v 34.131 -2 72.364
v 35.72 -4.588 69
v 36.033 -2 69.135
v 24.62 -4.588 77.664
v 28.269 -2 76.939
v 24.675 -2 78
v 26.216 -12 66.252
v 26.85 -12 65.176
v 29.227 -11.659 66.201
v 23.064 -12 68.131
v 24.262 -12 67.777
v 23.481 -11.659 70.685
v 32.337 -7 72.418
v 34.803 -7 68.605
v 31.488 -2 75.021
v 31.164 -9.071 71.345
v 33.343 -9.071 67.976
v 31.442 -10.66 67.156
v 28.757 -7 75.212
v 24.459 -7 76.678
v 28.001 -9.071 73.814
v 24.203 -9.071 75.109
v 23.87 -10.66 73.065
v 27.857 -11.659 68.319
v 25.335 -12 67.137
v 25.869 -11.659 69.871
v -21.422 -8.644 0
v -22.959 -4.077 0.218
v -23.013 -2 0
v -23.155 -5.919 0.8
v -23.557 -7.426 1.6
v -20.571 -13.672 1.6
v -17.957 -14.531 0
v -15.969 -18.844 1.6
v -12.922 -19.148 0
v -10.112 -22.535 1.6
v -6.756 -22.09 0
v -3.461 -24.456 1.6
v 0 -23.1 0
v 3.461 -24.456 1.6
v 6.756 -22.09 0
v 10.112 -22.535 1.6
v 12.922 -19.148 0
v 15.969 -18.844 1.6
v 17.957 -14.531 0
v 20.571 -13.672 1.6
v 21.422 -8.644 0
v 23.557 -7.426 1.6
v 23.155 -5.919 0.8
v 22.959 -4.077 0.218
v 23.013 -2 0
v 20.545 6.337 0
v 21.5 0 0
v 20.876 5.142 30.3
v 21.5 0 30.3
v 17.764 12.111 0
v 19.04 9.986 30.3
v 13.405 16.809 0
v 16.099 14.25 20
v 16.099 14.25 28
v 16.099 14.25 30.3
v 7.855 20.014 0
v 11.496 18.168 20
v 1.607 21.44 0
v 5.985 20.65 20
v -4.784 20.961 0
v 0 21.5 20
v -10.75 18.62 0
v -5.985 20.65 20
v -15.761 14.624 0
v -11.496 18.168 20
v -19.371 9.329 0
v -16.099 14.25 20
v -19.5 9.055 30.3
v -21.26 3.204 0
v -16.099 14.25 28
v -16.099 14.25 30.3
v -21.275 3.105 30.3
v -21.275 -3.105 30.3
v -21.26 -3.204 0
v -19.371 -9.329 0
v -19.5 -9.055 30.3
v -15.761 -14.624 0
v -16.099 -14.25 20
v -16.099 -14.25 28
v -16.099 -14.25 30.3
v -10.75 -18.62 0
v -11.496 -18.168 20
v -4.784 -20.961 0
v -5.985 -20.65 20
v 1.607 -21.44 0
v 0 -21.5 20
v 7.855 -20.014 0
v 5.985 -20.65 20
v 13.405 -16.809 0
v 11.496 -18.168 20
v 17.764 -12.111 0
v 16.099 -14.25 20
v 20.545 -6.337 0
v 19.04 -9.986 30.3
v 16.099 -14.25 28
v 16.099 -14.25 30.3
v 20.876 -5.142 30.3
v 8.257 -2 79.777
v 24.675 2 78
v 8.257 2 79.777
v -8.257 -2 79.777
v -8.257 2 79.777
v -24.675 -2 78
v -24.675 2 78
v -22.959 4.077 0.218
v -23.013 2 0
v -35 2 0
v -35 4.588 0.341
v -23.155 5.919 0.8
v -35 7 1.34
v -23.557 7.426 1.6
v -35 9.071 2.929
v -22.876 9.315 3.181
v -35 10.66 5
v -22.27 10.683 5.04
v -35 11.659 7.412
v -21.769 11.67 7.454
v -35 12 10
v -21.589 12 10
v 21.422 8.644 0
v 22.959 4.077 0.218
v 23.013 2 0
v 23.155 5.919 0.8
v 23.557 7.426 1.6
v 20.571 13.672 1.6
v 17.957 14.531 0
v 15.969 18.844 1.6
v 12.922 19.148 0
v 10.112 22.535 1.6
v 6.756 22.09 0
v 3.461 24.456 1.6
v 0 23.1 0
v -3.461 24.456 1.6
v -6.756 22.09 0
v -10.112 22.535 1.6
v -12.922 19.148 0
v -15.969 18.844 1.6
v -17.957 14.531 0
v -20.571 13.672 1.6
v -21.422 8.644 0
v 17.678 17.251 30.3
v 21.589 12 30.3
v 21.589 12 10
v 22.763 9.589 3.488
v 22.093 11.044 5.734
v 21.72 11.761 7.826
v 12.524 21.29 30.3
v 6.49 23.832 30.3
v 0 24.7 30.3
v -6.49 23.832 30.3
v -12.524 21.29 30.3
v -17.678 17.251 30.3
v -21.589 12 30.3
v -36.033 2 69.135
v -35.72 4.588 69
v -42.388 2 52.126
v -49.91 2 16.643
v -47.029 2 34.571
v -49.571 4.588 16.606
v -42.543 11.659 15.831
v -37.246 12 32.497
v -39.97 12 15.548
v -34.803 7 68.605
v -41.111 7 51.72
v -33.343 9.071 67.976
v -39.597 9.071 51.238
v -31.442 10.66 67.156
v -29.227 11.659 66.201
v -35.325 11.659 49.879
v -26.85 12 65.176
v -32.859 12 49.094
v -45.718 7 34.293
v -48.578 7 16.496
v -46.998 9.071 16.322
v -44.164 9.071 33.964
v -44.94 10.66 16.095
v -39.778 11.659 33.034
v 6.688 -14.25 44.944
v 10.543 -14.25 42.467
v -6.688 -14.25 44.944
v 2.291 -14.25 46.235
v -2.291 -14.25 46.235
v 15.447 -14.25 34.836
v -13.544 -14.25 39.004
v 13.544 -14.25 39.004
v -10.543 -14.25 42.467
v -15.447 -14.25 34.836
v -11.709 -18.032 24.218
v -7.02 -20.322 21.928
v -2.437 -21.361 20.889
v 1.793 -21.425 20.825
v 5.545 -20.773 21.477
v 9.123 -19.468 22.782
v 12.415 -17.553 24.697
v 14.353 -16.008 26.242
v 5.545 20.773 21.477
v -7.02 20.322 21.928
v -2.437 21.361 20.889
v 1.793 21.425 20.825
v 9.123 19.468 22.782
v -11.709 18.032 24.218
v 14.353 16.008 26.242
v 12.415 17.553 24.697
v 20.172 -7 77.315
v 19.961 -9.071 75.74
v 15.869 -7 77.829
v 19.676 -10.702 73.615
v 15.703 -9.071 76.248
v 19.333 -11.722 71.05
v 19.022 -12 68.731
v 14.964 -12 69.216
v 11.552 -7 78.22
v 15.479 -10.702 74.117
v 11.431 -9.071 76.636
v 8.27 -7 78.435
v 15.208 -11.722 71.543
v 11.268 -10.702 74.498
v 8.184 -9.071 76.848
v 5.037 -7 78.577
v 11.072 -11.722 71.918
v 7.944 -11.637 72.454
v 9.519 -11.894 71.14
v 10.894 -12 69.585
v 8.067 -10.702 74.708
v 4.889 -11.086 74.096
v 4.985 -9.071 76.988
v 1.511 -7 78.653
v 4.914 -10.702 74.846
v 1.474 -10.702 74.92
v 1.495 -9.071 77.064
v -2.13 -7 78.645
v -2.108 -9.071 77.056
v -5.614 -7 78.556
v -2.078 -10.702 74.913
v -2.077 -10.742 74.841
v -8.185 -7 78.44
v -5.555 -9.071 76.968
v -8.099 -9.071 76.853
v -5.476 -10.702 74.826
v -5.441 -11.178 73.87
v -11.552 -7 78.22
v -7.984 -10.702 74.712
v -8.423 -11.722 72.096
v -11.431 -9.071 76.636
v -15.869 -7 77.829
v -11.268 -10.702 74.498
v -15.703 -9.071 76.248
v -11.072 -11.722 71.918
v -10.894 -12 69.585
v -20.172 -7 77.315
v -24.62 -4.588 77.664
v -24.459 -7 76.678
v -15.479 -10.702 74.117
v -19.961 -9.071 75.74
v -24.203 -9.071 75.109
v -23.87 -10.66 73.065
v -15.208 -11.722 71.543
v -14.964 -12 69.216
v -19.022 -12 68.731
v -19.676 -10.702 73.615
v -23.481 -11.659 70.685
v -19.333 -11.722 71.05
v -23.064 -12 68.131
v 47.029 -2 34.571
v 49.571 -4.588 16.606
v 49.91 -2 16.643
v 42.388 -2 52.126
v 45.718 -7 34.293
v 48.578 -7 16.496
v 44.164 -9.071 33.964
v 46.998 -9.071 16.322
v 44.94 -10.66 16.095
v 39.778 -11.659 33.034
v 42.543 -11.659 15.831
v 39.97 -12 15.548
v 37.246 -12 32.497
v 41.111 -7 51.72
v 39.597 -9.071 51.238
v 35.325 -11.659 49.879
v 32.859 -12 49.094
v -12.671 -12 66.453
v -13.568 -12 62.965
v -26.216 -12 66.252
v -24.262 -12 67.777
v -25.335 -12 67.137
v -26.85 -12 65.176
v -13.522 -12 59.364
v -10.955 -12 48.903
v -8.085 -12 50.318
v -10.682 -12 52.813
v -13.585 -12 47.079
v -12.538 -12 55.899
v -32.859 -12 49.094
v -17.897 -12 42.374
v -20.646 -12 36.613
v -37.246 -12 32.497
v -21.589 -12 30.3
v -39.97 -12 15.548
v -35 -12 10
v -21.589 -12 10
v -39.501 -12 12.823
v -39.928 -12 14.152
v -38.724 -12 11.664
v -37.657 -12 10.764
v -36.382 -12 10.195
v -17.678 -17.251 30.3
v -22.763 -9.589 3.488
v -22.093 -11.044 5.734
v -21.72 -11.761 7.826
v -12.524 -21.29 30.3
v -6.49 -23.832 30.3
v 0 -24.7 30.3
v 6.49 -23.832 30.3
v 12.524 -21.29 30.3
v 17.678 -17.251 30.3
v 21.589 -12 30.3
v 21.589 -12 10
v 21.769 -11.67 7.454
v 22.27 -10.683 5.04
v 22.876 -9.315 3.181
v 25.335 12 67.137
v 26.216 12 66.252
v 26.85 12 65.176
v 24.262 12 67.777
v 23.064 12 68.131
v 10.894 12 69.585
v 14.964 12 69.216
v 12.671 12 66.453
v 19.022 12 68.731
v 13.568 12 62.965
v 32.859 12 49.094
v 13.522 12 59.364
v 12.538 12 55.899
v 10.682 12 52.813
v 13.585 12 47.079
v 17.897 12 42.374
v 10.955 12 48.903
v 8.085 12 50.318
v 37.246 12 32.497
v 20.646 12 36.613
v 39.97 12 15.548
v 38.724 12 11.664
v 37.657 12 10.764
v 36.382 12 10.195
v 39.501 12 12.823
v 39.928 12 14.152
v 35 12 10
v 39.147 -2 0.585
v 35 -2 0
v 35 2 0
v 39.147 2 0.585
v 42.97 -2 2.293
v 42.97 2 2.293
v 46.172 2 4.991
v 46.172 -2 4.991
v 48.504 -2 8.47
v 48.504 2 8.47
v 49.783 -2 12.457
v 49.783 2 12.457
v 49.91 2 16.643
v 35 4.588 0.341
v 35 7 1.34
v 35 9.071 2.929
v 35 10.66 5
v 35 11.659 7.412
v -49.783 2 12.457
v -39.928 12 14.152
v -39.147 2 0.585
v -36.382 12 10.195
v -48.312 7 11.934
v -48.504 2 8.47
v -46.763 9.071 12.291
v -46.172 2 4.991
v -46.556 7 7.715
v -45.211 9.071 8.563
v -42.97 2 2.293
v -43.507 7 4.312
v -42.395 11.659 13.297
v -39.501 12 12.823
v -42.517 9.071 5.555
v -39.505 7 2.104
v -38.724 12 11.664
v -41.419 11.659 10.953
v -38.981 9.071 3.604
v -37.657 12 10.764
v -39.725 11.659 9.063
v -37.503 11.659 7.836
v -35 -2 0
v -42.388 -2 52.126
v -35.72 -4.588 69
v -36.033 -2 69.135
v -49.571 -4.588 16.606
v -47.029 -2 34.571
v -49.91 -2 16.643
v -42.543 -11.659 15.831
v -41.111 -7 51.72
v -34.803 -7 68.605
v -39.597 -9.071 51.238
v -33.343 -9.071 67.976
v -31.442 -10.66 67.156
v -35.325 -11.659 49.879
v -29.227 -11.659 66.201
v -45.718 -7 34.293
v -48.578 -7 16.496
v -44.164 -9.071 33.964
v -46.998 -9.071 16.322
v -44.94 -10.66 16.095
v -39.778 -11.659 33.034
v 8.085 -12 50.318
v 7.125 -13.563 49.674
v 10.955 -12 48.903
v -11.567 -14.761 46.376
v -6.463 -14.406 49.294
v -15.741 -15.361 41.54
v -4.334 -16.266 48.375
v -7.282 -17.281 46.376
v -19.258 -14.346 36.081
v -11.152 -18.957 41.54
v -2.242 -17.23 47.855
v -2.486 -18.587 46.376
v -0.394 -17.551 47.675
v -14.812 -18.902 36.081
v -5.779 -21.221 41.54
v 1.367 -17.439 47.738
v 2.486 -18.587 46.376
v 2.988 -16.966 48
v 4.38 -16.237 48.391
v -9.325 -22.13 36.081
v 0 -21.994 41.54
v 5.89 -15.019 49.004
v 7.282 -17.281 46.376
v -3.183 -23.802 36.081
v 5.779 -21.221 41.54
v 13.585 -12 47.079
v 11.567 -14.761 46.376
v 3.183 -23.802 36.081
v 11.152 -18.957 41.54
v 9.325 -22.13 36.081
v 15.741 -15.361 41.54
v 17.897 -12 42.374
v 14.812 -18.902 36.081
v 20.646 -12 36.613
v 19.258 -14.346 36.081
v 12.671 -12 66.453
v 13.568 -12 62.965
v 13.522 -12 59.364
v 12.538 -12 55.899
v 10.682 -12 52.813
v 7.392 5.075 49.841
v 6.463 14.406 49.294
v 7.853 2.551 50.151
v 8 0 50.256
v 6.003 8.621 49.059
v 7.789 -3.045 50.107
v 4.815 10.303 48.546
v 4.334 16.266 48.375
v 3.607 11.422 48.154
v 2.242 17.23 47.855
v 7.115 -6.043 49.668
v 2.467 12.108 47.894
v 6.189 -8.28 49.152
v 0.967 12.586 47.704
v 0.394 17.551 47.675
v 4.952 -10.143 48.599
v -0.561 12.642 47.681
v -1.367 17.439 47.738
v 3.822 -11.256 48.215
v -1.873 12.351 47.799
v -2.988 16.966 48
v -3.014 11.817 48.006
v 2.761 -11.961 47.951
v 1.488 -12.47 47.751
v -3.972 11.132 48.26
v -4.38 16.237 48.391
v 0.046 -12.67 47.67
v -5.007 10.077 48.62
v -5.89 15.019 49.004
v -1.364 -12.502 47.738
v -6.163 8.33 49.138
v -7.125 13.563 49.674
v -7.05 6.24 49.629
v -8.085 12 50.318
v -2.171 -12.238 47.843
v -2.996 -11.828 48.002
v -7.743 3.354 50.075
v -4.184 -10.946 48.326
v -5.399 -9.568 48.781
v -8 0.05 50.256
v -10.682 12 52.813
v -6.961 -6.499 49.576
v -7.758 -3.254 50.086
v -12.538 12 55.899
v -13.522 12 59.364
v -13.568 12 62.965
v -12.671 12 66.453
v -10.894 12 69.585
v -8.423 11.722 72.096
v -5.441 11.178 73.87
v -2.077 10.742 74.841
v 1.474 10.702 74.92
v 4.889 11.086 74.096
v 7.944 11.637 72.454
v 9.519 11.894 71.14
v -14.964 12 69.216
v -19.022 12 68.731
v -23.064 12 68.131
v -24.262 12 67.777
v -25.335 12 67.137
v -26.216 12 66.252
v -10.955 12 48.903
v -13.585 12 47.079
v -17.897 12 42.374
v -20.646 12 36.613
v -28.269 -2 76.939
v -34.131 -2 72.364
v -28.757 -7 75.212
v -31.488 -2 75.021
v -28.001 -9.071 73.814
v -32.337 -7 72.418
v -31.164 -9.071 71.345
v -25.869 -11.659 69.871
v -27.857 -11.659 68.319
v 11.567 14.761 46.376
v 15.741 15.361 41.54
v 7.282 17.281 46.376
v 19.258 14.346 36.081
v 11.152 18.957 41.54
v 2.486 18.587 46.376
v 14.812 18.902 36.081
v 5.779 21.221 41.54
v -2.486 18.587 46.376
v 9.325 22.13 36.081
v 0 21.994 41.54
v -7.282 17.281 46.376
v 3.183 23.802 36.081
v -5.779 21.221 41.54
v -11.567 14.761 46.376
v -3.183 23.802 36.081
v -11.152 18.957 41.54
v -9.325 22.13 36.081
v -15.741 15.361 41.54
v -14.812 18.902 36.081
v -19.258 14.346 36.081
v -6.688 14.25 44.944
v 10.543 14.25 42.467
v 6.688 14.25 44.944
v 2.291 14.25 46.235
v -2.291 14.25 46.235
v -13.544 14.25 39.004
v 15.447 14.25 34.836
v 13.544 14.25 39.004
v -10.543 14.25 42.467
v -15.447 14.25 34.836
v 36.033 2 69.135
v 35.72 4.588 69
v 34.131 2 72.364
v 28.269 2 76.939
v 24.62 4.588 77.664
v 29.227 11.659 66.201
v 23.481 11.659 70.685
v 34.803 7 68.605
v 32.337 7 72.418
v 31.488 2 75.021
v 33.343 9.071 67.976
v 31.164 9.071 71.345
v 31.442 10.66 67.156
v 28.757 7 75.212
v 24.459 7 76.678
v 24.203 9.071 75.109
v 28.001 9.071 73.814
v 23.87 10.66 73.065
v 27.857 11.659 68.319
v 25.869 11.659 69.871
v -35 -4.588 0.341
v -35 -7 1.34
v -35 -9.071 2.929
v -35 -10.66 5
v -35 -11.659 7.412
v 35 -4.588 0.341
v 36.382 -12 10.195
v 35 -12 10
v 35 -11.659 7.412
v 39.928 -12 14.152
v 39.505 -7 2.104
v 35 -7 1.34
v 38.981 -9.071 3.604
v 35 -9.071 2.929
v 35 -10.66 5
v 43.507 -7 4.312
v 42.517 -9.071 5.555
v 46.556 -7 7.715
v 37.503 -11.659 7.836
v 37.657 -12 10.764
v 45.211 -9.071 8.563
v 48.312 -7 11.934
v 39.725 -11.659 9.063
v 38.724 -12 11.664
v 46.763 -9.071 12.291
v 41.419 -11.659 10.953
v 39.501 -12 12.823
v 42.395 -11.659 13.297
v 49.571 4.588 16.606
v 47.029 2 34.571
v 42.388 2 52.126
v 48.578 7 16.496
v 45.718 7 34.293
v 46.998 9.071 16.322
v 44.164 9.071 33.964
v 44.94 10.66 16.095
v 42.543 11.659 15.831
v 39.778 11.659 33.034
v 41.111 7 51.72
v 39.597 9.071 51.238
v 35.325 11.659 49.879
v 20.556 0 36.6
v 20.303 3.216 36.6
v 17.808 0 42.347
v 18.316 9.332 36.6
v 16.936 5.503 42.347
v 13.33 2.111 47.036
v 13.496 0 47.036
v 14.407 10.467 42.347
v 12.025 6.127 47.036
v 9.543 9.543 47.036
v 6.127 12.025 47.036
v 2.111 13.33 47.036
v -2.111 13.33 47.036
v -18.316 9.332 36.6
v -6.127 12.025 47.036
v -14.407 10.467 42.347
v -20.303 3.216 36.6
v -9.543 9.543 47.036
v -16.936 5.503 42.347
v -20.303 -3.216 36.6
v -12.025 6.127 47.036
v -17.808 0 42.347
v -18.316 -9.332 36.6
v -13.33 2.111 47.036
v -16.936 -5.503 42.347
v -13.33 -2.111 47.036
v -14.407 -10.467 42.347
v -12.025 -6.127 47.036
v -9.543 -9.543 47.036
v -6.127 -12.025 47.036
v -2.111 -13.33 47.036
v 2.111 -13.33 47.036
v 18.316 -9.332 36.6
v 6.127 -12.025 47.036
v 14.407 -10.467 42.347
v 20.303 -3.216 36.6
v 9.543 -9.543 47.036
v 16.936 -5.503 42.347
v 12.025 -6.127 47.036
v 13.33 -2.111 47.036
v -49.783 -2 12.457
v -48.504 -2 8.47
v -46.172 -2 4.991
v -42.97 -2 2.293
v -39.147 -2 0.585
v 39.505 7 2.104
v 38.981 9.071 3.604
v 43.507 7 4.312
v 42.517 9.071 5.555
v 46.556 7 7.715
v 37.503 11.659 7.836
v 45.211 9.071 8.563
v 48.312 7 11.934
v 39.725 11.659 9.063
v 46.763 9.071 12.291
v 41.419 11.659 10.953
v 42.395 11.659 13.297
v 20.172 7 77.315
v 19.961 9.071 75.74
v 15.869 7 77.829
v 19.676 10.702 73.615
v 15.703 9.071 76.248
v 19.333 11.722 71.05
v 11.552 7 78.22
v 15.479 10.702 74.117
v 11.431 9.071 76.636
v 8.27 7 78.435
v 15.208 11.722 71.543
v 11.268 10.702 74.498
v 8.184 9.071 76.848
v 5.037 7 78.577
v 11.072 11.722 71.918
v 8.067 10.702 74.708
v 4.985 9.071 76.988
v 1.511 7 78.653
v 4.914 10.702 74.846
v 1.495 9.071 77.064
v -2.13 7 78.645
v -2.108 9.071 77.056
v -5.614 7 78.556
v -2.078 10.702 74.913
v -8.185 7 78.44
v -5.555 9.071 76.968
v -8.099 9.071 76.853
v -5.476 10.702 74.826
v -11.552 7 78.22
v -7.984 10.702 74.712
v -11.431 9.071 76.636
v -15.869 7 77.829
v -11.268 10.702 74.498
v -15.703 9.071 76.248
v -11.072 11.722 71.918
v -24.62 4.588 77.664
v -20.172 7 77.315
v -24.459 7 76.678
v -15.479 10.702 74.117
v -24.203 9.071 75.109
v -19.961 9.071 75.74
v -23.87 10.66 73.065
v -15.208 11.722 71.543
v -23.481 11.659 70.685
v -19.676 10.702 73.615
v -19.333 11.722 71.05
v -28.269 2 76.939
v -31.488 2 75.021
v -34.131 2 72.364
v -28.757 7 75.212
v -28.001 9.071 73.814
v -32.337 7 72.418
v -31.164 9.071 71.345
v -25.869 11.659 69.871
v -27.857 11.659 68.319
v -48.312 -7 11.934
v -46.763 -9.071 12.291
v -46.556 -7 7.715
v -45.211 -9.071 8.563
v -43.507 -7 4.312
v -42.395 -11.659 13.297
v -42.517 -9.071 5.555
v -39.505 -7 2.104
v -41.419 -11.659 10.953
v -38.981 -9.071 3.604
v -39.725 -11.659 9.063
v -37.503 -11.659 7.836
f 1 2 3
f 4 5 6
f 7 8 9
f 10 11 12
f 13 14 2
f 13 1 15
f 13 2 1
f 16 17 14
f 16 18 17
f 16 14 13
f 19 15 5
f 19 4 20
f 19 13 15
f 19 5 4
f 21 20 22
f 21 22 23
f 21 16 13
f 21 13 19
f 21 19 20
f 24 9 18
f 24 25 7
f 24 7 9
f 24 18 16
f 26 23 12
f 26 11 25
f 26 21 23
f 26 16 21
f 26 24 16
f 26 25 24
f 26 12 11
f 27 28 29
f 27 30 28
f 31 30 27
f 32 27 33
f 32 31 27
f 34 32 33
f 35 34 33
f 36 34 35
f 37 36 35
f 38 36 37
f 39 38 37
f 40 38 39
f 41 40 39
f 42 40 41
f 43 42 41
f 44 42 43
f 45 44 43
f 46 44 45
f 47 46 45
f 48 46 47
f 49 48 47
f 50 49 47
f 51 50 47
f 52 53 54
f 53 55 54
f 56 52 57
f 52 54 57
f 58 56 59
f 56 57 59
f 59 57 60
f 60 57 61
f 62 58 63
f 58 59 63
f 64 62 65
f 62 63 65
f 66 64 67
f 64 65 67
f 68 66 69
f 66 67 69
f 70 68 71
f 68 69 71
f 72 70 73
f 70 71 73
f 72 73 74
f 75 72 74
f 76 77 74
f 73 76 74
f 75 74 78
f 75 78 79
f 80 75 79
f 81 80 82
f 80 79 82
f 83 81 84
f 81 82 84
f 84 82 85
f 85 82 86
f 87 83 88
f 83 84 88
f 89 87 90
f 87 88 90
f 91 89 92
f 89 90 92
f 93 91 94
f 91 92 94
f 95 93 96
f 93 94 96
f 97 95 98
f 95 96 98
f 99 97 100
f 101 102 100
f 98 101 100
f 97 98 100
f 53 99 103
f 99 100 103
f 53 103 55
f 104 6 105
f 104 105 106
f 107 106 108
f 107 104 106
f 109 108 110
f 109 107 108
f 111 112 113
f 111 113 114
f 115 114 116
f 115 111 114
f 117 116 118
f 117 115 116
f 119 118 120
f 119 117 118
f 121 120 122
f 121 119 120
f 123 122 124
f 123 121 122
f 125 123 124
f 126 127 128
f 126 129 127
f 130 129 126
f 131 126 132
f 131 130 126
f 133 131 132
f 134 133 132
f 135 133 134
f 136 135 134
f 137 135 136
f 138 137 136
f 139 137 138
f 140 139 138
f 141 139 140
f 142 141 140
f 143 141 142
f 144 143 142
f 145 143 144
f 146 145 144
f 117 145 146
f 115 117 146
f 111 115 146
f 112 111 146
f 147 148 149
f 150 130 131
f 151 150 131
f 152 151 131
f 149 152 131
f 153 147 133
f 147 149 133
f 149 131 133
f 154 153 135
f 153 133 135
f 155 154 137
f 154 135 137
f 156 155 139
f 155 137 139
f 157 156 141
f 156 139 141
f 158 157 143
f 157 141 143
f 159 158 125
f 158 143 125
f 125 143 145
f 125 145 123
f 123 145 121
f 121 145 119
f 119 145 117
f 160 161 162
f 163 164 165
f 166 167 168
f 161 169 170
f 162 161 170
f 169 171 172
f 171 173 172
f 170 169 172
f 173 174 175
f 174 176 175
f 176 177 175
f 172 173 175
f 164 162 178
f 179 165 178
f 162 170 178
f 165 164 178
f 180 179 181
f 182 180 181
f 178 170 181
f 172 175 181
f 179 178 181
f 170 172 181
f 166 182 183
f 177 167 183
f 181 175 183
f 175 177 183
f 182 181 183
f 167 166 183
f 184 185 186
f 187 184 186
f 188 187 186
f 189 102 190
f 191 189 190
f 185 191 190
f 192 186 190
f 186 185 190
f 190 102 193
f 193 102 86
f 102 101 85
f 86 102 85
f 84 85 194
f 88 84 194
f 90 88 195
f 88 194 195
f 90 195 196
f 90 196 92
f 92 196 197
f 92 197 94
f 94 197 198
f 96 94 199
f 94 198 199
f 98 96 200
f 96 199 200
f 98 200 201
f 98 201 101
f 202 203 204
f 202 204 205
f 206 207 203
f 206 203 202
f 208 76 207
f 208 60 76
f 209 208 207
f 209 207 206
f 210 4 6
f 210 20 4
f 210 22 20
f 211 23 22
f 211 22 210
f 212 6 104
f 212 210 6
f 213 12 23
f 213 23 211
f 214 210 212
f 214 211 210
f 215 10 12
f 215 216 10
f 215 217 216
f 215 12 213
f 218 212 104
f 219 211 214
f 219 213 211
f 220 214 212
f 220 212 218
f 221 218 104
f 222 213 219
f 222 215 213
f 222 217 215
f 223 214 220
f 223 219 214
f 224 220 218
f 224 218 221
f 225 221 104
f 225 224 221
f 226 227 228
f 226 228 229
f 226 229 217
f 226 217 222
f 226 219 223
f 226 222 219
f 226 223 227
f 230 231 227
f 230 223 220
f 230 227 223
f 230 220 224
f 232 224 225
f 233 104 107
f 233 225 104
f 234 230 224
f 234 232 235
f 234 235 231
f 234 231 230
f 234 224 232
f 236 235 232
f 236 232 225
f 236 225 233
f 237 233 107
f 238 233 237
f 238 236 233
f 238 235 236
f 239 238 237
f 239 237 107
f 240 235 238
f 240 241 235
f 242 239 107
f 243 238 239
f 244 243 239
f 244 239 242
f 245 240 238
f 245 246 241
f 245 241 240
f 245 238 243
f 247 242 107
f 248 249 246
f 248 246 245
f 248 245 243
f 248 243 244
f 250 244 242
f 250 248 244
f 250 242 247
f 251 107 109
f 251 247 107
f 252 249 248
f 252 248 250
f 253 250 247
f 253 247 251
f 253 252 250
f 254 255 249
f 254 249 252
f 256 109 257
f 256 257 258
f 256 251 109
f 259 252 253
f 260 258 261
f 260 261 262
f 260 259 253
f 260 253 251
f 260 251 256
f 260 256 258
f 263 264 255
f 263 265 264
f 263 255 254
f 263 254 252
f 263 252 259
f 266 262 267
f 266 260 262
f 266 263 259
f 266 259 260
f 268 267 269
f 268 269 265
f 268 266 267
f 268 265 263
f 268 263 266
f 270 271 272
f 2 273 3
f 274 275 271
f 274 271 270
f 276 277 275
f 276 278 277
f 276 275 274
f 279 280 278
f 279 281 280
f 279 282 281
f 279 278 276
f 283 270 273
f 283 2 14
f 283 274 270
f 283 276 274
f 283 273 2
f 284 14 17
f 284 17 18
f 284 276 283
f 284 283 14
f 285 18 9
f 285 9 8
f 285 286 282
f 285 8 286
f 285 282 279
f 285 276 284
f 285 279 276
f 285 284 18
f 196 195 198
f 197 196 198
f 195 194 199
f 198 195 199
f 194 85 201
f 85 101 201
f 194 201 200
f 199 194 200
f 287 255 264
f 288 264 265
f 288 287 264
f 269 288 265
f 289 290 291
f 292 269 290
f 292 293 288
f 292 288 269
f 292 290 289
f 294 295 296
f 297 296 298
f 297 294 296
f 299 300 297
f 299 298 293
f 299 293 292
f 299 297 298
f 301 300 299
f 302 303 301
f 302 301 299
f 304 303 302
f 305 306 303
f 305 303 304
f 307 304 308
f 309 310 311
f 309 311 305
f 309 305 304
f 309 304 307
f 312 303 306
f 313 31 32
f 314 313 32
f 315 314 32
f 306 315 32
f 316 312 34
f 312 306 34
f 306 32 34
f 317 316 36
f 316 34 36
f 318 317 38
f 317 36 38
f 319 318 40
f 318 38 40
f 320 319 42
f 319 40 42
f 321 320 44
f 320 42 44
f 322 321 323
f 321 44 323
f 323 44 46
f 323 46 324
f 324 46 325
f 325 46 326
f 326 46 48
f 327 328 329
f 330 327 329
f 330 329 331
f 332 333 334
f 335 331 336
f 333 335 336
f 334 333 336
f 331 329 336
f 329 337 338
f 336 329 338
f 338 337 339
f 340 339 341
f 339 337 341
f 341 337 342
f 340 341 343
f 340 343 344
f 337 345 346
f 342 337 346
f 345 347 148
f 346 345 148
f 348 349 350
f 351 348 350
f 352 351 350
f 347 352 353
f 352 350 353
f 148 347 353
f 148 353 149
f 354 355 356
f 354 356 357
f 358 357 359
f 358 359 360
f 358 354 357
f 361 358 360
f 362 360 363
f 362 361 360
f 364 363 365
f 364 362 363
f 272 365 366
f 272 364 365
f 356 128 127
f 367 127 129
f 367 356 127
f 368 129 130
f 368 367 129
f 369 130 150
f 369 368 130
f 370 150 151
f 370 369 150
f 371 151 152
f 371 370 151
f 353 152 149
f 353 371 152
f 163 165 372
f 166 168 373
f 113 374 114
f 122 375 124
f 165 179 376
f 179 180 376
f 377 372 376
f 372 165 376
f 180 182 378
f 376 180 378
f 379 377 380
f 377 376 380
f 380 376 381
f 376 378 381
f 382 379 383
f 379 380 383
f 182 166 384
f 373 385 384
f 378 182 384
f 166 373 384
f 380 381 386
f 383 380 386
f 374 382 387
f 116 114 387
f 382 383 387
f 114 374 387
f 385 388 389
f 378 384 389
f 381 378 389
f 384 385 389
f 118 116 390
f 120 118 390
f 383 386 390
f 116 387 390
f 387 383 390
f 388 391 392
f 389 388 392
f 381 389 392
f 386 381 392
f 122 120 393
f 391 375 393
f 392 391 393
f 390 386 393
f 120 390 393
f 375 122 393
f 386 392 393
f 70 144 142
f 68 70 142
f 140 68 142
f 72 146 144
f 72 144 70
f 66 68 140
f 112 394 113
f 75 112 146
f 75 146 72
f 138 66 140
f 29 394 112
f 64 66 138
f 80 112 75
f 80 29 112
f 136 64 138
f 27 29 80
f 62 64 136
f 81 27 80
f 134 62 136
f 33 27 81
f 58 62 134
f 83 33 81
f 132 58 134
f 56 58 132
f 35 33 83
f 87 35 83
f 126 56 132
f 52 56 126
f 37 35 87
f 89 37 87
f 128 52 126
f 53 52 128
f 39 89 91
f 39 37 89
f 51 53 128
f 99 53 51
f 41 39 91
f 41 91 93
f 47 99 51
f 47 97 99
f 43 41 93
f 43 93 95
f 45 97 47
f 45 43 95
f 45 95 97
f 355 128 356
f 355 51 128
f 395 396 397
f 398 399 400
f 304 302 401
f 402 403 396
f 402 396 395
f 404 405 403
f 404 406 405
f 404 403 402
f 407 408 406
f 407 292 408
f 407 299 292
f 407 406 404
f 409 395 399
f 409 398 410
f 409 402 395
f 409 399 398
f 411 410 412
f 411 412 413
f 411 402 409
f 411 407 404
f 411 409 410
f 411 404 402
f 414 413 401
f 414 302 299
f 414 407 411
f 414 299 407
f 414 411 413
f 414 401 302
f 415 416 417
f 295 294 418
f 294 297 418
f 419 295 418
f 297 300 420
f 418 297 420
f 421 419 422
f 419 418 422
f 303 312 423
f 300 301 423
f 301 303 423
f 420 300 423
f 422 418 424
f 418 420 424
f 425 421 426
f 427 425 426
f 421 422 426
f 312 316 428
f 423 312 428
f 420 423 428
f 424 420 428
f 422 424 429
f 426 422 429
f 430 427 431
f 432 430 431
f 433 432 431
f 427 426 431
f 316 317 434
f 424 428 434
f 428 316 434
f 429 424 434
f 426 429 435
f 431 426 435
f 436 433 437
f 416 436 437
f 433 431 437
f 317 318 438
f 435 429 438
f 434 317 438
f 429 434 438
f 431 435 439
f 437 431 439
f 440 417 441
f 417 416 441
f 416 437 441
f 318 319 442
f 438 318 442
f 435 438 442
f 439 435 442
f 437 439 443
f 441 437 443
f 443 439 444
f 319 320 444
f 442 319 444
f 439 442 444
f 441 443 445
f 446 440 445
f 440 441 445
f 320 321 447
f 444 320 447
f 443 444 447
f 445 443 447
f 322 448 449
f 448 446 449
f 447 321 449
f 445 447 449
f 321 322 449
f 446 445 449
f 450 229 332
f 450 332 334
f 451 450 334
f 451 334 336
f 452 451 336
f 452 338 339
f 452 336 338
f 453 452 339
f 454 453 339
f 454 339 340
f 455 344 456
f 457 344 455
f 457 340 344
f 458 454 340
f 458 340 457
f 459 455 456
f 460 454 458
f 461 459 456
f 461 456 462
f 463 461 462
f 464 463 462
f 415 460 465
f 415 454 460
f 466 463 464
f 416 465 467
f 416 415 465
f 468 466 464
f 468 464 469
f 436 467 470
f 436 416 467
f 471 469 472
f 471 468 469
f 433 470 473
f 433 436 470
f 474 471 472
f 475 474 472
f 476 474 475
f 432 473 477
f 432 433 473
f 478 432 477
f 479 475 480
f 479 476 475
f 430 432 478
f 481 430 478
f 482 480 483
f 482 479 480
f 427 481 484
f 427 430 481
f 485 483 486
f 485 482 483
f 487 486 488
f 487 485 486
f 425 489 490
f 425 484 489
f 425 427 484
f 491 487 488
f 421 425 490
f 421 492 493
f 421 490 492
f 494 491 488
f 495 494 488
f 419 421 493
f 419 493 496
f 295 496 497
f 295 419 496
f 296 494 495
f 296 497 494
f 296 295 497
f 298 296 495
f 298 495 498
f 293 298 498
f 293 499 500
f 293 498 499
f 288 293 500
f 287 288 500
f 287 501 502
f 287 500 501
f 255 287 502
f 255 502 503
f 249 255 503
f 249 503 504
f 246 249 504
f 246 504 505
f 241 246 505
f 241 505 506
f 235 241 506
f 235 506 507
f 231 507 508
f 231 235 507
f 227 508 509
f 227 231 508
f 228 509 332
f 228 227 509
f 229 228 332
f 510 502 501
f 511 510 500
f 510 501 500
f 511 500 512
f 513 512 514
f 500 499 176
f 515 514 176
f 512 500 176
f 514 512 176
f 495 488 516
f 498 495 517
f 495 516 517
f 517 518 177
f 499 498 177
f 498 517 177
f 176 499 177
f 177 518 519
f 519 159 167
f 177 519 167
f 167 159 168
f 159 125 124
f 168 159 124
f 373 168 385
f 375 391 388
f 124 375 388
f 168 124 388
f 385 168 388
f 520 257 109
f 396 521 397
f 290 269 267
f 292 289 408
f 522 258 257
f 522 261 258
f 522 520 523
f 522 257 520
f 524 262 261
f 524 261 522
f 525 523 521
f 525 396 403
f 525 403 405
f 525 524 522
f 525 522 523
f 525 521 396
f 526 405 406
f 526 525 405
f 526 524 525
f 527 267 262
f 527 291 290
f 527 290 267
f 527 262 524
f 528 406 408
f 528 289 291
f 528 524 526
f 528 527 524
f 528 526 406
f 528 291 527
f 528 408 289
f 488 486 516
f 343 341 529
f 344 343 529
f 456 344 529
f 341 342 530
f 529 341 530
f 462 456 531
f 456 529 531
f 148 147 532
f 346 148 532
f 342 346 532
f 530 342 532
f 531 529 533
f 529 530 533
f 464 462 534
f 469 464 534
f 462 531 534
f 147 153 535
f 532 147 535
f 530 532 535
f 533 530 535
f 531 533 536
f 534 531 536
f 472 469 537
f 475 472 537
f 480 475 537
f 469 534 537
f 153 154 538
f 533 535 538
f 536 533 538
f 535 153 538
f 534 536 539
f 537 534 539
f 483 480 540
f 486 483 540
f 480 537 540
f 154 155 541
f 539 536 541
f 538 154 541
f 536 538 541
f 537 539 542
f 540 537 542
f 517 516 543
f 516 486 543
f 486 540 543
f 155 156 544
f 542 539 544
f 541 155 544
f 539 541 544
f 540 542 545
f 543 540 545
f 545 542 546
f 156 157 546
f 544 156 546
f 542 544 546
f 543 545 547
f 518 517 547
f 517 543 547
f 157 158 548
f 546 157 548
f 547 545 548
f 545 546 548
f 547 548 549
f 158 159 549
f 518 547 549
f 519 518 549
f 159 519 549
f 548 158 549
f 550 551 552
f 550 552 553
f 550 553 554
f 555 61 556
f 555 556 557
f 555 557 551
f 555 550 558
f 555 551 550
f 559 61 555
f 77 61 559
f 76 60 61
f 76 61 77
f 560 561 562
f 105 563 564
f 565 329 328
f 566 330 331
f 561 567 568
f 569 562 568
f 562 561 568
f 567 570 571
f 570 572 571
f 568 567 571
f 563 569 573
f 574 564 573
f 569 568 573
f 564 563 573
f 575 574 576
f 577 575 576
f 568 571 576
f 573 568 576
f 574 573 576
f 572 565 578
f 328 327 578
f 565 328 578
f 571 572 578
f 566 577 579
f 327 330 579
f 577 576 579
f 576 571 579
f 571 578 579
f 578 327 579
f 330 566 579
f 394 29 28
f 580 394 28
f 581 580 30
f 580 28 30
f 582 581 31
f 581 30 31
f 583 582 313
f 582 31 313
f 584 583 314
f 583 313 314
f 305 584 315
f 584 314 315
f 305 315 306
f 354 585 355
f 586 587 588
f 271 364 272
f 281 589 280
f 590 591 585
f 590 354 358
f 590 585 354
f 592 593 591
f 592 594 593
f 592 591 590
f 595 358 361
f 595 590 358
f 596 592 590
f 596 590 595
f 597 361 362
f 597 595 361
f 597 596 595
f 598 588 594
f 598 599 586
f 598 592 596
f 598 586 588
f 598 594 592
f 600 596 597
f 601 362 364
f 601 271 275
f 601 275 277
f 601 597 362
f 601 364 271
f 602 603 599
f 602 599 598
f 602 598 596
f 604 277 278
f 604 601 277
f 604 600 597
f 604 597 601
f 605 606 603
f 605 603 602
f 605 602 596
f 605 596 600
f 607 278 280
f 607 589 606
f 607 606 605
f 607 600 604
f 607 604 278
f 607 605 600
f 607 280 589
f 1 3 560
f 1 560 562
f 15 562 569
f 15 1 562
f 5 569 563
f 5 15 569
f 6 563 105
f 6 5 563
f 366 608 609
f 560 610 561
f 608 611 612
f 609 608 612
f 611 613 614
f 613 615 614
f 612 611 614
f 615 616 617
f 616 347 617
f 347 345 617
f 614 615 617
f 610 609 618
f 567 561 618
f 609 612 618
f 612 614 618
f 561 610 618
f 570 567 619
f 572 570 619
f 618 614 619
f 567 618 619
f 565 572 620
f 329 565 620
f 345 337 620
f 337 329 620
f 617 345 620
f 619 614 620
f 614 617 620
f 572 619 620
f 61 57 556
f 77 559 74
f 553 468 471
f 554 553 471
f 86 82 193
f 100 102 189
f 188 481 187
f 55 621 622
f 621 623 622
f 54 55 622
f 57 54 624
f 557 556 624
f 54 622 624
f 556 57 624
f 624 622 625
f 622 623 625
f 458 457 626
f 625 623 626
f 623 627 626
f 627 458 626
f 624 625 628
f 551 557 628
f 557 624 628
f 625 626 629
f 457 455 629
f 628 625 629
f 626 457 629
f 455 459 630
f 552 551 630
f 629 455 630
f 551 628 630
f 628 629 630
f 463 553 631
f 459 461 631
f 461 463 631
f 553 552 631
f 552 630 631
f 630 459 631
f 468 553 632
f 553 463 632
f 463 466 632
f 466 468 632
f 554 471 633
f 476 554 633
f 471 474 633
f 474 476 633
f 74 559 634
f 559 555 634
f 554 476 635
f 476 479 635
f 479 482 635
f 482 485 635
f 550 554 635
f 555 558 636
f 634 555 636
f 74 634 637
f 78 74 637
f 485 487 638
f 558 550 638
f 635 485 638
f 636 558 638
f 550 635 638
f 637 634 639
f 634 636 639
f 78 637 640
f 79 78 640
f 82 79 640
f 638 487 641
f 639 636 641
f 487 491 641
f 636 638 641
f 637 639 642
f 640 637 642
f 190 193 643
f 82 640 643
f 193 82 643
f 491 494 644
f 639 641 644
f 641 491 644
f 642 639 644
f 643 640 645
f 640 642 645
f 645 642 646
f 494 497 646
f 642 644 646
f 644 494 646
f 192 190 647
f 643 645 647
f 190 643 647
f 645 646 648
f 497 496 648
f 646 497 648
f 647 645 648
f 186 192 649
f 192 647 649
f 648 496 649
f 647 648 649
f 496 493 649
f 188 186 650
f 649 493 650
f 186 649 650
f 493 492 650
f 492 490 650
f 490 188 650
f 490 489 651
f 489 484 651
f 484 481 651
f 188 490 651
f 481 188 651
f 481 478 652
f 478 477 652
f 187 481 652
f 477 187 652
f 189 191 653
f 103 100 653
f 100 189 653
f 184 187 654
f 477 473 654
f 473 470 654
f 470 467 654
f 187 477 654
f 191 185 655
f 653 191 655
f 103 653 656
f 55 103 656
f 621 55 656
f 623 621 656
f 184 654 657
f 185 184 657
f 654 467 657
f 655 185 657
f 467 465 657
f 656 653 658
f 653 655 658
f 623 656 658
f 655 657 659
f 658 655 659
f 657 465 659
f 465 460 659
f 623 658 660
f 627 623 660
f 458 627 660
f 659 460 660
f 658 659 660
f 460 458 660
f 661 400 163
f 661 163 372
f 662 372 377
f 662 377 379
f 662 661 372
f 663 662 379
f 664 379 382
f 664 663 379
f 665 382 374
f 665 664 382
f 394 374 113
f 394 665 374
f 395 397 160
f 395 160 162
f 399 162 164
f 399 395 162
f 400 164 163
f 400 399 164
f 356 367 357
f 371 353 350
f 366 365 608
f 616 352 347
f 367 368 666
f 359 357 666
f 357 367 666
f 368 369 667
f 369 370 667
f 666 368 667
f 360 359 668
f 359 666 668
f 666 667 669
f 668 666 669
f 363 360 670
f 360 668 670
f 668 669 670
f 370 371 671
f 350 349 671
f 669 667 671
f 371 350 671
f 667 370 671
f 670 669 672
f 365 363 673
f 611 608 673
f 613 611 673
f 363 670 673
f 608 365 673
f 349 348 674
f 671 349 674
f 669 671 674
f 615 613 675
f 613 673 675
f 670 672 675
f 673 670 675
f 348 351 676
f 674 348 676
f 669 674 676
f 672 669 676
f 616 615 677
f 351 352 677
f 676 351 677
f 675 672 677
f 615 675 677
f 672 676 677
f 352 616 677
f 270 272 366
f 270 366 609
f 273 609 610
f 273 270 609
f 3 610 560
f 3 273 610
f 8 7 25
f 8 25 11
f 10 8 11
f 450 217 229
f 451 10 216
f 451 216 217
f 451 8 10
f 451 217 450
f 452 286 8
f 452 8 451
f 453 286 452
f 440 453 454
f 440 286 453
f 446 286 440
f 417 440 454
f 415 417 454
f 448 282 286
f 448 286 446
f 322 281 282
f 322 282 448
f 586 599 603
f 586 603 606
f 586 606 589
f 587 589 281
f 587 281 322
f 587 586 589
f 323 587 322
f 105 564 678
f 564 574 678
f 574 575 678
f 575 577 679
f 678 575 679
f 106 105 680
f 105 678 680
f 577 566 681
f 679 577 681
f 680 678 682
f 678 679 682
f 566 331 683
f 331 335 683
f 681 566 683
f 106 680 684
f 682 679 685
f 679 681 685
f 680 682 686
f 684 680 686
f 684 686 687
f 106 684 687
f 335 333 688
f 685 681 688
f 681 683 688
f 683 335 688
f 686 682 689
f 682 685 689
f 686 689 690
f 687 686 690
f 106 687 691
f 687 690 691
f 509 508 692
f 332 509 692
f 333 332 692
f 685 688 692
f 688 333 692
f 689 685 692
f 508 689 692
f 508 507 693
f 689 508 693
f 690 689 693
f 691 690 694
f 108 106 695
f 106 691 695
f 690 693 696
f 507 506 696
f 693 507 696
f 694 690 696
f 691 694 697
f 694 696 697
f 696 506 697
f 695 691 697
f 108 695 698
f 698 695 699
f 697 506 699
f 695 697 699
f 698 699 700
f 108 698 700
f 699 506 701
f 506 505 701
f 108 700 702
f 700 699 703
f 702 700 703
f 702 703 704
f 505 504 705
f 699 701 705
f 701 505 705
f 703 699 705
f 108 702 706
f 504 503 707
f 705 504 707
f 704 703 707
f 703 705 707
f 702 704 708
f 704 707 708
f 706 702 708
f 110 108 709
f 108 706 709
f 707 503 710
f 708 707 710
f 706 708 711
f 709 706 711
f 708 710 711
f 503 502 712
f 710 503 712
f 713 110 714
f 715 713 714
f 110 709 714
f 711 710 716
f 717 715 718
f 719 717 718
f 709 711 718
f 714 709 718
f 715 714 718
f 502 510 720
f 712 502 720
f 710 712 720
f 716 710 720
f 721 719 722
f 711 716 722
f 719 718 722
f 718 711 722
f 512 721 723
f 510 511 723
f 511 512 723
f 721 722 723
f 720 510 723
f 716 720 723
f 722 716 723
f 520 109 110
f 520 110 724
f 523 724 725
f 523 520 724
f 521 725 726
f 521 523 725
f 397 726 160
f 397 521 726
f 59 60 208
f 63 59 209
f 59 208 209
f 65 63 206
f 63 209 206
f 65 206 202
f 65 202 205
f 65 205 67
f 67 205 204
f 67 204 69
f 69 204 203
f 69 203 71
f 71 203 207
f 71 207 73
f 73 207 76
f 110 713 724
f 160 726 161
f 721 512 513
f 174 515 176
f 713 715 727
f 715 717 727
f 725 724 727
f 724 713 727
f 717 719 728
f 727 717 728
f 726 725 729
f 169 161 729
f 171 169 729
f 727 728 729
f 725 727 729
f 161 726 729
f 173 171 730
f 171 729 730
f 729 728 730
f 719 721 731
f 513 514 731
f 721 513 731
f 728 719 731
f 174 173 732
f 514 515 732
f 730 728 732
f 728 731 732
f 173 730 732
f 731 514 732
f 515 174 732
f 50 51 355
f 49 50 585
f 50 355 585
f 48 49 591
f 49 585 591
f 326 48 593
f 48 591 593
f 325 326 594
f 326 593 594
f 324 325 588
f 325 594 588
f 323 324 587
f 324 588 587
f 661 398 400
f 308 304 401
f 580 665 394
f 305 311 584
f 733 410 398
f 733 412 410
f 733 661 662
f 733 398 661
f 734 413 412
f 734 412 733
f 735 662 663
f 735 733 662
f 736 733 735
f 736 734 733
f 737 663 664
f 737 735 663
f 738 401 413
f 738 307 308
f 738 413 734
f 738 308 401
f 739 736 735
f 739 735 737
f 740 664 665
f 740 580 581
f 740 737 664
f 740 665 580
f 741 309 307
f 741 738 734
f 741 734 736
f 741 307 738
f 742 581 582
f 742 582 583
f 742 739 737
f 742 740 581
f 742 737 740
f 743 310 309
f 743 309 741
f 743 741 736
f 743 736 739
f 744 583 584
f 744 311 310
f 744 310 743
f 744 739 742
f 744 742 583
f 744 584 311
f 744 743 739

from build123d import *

# Parameters (mm, degrees)
BOSS_EXTRUDE1_DEPTH      = 12
BOSS_EXTRUDE1_DEPTH_BACK = 12
FILLET1_R                = 10
BOSS_EXTRUDE2_REACH      = 83.915
CUT_EXTRUDE1_DEPTH       = 98.519690427
CUT_EXTRUDE1_DEPTH_BACK  = 98.519690427
SKETCH5_R                = 13.665152344
CHAMFER1_SIZE            = 8
CHAMFER2_SIZE            = 1.6


with BuildPart() as part:
    # Sketch1 → Boss-Extrude1 (new, two sides: drawn at the far end of the back side and taken through both)
    with BuildSketch(Plane(origin=(0, 0, 0), x_dir=(1, 0, 0), z_dir=(0, 1, 0)).offset(-BOSS_EXTRUDE1_DEPTH_BACK)):
        with BuildLine():
            Line((-35, 0), (35, 0))
            ThreePointArc((35, 0), (46.17246087, -4.991197968), (49.909726541, -16.643184251))
            ThreePointArc((49.909726541, -16.643184251), (44.926099942, -43.406027638), (36.03300946, -69.135373954))
            ThreePointArc((36.03300946, -69.135373954), (31.487933236, -75.020695994), (24.674822271, -78))
            ThreePointArc((24.674822271, -78), (0, -80), (-24.674822271, -78))
            ThreePointArc((-24.674822271, -78), (-31.487933236, -75.020695994), (-36.03300946, -69.135373954))
            ThreePointArc((-36.03300946, -69.135373954), (-44.926099942, -43.406027638), (-49.909726541, -16.643184251))
            ThreePointArc((-49.909726541, -16.643184251), (-46.17246087, -4.991197968), (-35, 0))
        make_face()
    extrude(amount=BOSS_EXTRUDE1_DEPTH + BOSS_EXTRUDE1_DEPTH_BACK)

    # Fillet1
    fillet1_edges = [part.edges().sort_by_distance(p)[0] for p in [
        (-46.17246087, -12, 4.991197968),
        (-44.926099942, -12, 43.406027638),
        (-31.487933236, -12, 75.020695994),
        (46.17246087, 12, 4.991197968),
        (0, 12, 0),
        (-46.17246087, 12, 4.991197968),
        (-44.926099942, 12, 43.406027638),
        (-31.487933236, 12, 75.020695994),
        (0, -12, 80),
        (0, 12, 80),
        (31.487933236, 12, 75.020695994),
        (44.926099942, 12, 43.406027638),
        (31.487933236, -12, 75.020695994),
        (44.926099942, -12, 43.406027638),
        (46.17246087, -12, 4.991197968),
        (0, -12, 0),
    ]]
    fillet(fillet1_edges, radius=FILLET1_R)

    # Sketch2 → Revolve1 (revolve)
    with BuildSketch(Plane(origin=(0, 0, 0), x_dir=(1, 0, 0), z_dir=(0, 1, 0))):
        with BuildLine():
            Line((0, 0), (0, -55))
            ThreePointArc((0, -55), (17.465537495, -47.765537495), (24.7, -30.3))
            Line((24.7, -30.3), (24.7, 0))
            Line((24.7, 0), (0, 0))
        make_face()
    revolve(axis=Axis((0, 0, 0), (0, 0, 1)))

    # Sketch3 → Cut-Revolve1 (revolve, cut)
    with BuildSketch(Plane(origin=(0, 0, 0), x_dir=(1, 0, 0), z_dir=(0, 1, 0))):
        with BuildLine():
            Line((21.5, 0), (21.5, -30.3))
            ThreePointArc((21.5, -30.3), (15.202795796, -45.502795796), (0, -51.8))
            Line((0, -51.8), (0, 0))
            Line((0, 0), (21.5, 0))
        make_face()
    revolve(axis=Axis((0, 0, 0), (0, 0, 1)), mode=Mode.SUBTRACT)

    # Sketch4 → Boss-Extrude2 (add, up to next)
    with BuildSketch(Plane(origin=(0, 0, 20), x_dir=(-1, 0, 0), z_dir=(0, 0, -1)), mode=Mode.PRIVATE) as boss_extrude2_sk1:
        with BuildLine():
            Line((-16.099301227, 14.25), (16.099301227, 14.25))
            ThreePointArc((16.099301227, 14.25), (0, 21.5), (-16.099301227, 14.25))
        make_face()
    boss_extrude2_tool1 = extrude(boss_extrude2_sk1.sketch, amount=-BOSS_EXTRUDE2_REACH, mode=Mode.PRIVATE) - part.part
    # Sketch4 → Boss-Extrude2 (add, up to next)
    with BuildSketch(Plane(origin=(0, 0, 20), x_dir=(-1, 0, 0), z_dir=(0, 0, -1)), mode=Mode.PRIVATE) as boss_extrude2_sk2:
        with BuildLine():
            Line((-16.099301227, -14.25), (16.099301227, -14.25))
            ThreePointArc((16.099301227, -14.25), (0, -21.5), (-16.099301227, -14.25))
        make_face()
    boss_extrude2_tool2 = extrude(boss_extrude2_sk2.sketch, amount=-BOSS_EXTRUDE2_REACH, mode=Mode.PRIVATE) - part.part
    add(boss_extrude2_tool1.solids().sort_by_distance((0, 17.196475, 20))[0])
    add(boss_extrude2_tool2.solids().sort_by_distance((0, -17.196475, 20))[0])

    # Sketch5 → Cut-Extrude1 (cut, two sides: drawn at the far end of the back side and taken through both)
    with BuildSketch(Plane(origin=(0, 0, 0), x_dir=(1, 0, 0), z_dir=(0, 1, 0)).offset(-CUT_EXTRUDE1_DEPTH_BACK)):
        with Locations(Location((0, -61.334847656, 0), (0, 0, 322.861585756))):
            Circle(SKETCH5_R)
    extrude(amount=CUT_EXTRUDE1_DEPTH + CUT_EXTRUDE1_DEPTH_BACK, mode=Mode.SUBTRACT)

    # Chamfer1
    # the kernel refuses this chamfer: 8 mm, written as the material it takes off along each edge
    with BuildSketch(Plane(origin=(36.672765131, 14.25, 20), x_dir=(0, -0.02749587661058627, 0.9996219169112968), z_dir=(-1, 0, 0))) as chamfer1_piece_1_section:
        Polygon((CHAMFER1_SIZE * 0.999621916911, CHAMFER1_SIZE * 0.0274958766106), (-CHAMFER1_SIZE * 0.0274958766106, CHAMFER1_SIZE * 0.999621916911), (0, 0), align=None)
    chamfer1_piece_1 = extrude(amount=73.345530262, mode=Mode.PRIVATE)
    chamfer1_piece_1 = chamfer1_piece_1 & Plane(origin=(0, 0, 22.88602407), x_dir=(1, 0, 0), z_dir=(0, 0, 1)) * Cylinder(21.5, 179, mode=Mode.PRIVATE)
    add(chamfer1_piece_1, mode=Mode.SUBTRACT)
    with BuildSketch(Plane(origin=(36.672765131, -14.25, 20), x_dir=(0, 0.02749587661058627, 0.9996219169112968), z_dir=(-1, 0, 0))) as chamfer1_piece_2_section:
        Polygon((CHAMFER1_SIZE * 0.999621916911, -CHAMFER1_SIZE * 0.0274958766106), (-CHAMFER1_SIZE * 0.0274958766106, -CHAMFER1_SIZE * 0.999621916911), (0, 0), align=None)
    chamfer1_piece_2 = extrude(amount=73.345530262, mode=Mode.PRIVATE)
    chamfer1_piece_2 = chamfer1_piece_2 & Plane(origin=(0, 0, 22.88602407), x_dir=(1, 0, 0), z_dir=(0, 0, 1)) * Cylinder(21.5, 179, mode=Mode.PRIVATE)
    add(chamfer1_piece_2, mode=Mode.SUBTRACT)

    # Chamfer2
    chamfer2_edges = [part.edges().sort_by_distance(p)[0] for p in [
        (0, 24.7, 0),
        (0, -24.7, 0),
    ]]
    chamfer(chamfer2_edges, length=CHAMFER2_SIZE)


solid = part.part
